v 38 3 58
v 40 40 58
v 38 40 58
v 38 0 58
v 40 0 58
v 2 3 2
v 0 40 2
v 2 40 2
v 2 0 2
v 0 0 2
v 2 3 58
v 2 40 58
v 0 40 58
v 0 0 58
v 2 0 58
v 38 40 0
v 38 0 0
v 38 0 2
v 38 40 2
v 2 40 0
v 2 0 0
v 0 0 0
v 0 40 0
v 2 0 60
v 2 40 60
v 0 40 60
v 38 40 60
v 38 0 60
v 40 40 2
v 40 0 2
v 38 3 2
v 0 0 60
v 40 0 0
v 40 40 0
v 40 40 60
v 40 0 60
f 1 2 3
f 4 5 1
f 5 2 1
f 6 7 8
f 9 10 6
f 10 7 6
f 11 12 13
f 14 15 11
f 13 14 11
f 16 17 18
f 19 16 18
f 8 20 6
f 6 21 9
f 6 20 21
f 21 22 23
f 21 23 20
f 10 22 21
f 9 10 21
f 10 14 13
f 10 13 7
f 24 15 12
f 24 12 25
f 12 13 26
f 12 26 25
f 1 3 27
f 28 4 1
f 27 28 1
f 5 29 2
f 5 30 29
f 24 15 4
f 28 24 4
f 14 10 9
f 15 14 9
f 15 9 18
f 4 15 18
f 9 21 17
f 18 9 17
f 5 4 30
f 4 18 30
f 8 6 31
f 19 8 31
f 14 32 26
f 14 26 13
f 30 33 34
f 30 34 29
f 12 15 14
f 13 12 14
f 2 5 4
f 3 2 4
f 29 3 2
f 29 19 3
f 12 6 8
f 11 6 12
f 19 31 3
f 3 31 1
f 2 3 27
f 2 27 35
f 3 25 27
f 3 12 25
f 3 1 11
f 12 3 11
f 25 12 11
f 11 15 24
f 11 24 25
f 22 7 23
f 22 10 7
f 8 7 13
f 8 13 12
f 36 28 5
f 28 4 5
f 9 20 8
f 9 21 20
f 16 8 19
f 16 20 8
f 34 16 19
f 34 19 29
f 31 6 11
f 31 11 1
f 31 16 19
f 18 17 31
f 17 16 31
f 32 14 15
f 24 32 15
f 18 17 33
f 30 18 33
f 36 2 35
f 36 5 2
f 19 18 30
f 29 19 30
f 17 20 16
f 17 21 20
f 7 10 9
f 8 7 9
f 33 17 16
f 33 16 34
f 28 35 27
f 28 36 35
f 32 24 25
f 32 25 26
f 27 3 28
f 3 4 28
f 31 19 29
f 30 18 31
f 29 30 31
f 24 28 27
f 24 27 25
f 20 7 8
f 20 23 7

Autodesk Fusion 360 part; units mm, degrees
sketch "Sketch1" plane through (0, 0, 0) normal (0, 1, 0) x (1, 0, 0)
  line L0 (0, 0) -> (40, 0)
  line L1 (40, 0) -> (40, -60)
  line L2 (40, -60) -> (0, -60)
  line L3 (0, -60) -> (0, 0)
  line L4 (0, 0) -> (2, 0)
  line L5 (2, 0) -> (2, -60)
  line L6 (2, -60) -> (0, -60)
  line L7 (0, -60) -> (0, 0)
  line L8 (40, 0) -> (38, 0)
  line L9 (38, 0) -> (38, -60)
  line L10 (38, -60) -> (40, -60)
  line L11 (40, -60) -> (40, 0)
  line L12 (40, 0) -> (0, 0)
  line L13 (0, 0) -> (0, -2)
  line L14 (0, -2) -> (40, -2)
  line L15 (40, -2) -> (40, 0)
  line L16 (0, -60) -> (40, -60)
  line L17 (40, -60) -> (40, -58)
  line L18 (40, -58) -> (0, -58)
  line L19 (0, -58) -> (0, -60)
  dimension "d1" = 2
  dimension "d2" = 2
  dimension "d3" = 2
  dimension "d4" = 2
extrude "Extrude1" add sketch "Sketch1" along normal blind 40 contours L0 L5 L9 L12 L14 makes body 1
extrude "Extrude2" add sketch "Sketch1" along normal blind 40 separate body contours L3 L5 L7 L14 L18 makes body 2
extrude "Extrude3" add sketch "Sketch1" along normal blind 40 separate body contours L1 L9 L11 L14 L18 makes body 3
extrude "Extrude4" add sketch "Sketch1" along normal blind 40 separate body contours L2 L5 L9 L16 L18 makes body 4
extrude "Extrude5" add sketch "Sketch1" along normal blind 3 contours L5 L9 L14 L18 bodies 1 2 3 4
extrude "Extrude6" add sketch "Sketch1" along normal blind 40 separate body contours L0 L3 L4 L5 L7 L12 L13 L14 makes body 5
extrude "Extrude7" add sketch "Sketch1" along normal blind 40 separate body contours L2 L3 L5 L6 L7 L16 L18 L19 makes body 6
extrude "Extrude8" add sketch "Sketch1" along normal blind 40 separate body contours L1 L2 L9 L10 L11 L16 L17 L18 makes body 7
extrude "Extrude9" add sketch "Sketch1" along normal blind 40 separate body contours L0 L1 L8 L9 L11 L12 L14 L15 makes body 8
